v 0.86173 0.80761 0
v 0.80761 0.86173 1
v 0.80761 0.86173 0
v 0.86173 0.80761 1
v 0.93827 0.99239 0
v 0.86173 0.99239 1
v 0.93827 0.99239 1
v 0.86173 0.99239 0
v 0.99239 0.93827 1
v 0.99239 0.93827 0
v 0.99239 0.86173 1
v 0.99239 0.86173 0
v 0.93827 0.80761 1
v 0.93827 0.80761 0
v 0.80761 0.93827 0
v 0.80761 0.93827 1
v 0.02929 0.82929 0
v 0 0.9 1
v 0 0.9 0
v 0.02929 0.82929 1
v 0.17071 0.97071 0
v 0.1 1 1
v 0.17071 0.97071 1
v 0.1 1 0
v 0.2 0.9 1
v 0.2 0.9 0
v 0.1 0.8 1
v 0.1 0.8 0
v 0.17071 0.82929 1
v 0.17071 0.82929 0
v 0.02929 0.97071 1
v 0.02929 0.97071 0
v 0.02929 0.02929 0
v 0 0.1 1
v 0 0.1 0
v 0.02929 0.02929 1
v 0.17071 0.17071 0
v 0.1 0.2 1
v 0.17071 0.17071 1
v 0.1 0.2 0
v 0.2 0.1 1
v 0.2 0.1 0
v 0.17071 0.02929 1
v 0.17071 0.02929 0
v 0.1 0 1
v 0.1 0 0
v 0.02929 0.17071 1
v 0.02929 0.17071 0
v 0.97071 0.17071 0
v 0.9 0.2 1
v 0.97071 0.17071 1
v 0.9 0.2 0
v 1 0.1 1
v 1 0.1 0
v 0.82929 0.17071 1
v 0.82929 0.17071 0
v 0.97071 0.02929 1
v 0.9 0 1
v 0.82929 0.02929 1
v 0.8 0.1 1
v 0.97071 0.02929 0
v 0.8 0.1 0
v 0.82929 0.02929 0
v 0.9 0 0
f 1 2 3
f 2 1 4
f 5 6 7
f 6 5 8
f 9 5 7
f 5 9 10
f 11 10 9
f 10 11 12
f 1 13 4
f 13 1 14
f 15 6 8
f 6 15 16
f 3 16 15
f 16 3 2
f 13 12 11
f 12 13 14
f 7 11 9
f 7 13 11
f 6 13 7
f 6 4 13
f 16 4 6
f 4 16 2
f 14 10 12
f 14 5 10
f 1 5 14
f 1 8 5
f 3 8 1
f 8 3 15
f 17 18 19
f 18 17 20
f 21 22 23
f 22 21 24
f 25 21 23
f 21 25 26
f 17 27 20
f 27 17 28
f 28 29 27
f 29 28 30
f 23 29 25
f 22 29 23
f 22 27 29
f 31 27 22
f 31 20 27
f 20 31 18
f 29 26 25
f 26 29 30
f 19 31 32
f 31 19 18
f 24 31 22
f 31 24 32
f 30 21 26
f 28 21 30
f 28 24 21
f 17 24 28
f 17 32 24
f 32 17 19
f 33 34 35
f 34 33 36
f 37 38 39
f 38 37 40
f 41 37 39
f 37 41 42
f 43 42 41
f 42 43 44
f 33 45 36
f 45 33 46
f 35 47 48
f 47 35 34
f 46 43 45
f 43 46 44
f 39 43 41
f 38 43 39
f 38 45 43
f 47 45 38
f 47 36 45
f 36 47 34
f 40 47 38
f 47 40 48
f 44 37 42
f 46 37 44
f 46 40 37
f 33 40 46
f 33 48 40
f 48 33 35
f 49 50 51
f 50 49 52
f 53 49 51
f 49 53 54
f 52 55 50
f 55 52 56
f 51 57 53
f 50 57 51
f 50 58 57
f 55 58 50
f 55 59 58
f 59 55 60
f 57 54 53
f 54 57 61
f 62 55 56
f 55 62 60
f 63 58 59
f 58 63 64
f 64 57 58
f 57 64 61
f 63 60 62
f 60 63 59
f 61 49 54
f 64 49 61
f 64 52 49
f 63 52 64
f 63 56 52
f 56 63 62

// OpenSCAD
// use $fn % 4 = 0;
module cube_fillet(lwh=[1,1,1], r=0.1, corner_offsets=[0,0,0,0], $fn=8, center=true) {
    $fn = ceil($fn / 4) * 4;
    
    corner_rotation = 180 / $fn;
    
    center_translation = center ? [0,0,0] : [lwh[0] * 0.5, lwh[1] * 0.5, lwh[2] * 0.5, ];
    
    translate(center_translation){
        union(){
            //corners
            //NE
            translate([lwh[0] * 0.5 - r, lwh[1] * 0.5 - r, -lwh[2]*0.5]){ 
                rotate([0,0,corner_rotation]){
                    cylinder(h=lwh[2], r=r, $fn=$fn);
                }
            }
            //SE
            translate([-(lwh[0] * 0.5 - r), lwh[1] * 0.5 - r, -lwh[2]*0.5]){
                cylinder(h=lwh[2], r=r, $fn=$fn);
            }
            //NE
            translate([-(lwh[0] * 0.5 - r), -(lwh[1] * 0.5 - r), -lwh[2]*0.5]){
                cylinder(h=lwh[2], r=r, $fn=$fn);
            }
            //SE
            translate([lwh[0] * 0.5 - r, -(lwh[1] * 0.5 - r), -lwh[2]*0.5]){
                cylinder(h=lwh[2], r=r, $fn=$fn);
            }
            
            // boxes
            //cube([lwh[0] - 2*r, lwh[1], lwh[2]], true);
            //cube([lwh[0], lwh[1] - 2*r, lwh[2]], true);
        };
    }
};

cube_fillet(center=false);
